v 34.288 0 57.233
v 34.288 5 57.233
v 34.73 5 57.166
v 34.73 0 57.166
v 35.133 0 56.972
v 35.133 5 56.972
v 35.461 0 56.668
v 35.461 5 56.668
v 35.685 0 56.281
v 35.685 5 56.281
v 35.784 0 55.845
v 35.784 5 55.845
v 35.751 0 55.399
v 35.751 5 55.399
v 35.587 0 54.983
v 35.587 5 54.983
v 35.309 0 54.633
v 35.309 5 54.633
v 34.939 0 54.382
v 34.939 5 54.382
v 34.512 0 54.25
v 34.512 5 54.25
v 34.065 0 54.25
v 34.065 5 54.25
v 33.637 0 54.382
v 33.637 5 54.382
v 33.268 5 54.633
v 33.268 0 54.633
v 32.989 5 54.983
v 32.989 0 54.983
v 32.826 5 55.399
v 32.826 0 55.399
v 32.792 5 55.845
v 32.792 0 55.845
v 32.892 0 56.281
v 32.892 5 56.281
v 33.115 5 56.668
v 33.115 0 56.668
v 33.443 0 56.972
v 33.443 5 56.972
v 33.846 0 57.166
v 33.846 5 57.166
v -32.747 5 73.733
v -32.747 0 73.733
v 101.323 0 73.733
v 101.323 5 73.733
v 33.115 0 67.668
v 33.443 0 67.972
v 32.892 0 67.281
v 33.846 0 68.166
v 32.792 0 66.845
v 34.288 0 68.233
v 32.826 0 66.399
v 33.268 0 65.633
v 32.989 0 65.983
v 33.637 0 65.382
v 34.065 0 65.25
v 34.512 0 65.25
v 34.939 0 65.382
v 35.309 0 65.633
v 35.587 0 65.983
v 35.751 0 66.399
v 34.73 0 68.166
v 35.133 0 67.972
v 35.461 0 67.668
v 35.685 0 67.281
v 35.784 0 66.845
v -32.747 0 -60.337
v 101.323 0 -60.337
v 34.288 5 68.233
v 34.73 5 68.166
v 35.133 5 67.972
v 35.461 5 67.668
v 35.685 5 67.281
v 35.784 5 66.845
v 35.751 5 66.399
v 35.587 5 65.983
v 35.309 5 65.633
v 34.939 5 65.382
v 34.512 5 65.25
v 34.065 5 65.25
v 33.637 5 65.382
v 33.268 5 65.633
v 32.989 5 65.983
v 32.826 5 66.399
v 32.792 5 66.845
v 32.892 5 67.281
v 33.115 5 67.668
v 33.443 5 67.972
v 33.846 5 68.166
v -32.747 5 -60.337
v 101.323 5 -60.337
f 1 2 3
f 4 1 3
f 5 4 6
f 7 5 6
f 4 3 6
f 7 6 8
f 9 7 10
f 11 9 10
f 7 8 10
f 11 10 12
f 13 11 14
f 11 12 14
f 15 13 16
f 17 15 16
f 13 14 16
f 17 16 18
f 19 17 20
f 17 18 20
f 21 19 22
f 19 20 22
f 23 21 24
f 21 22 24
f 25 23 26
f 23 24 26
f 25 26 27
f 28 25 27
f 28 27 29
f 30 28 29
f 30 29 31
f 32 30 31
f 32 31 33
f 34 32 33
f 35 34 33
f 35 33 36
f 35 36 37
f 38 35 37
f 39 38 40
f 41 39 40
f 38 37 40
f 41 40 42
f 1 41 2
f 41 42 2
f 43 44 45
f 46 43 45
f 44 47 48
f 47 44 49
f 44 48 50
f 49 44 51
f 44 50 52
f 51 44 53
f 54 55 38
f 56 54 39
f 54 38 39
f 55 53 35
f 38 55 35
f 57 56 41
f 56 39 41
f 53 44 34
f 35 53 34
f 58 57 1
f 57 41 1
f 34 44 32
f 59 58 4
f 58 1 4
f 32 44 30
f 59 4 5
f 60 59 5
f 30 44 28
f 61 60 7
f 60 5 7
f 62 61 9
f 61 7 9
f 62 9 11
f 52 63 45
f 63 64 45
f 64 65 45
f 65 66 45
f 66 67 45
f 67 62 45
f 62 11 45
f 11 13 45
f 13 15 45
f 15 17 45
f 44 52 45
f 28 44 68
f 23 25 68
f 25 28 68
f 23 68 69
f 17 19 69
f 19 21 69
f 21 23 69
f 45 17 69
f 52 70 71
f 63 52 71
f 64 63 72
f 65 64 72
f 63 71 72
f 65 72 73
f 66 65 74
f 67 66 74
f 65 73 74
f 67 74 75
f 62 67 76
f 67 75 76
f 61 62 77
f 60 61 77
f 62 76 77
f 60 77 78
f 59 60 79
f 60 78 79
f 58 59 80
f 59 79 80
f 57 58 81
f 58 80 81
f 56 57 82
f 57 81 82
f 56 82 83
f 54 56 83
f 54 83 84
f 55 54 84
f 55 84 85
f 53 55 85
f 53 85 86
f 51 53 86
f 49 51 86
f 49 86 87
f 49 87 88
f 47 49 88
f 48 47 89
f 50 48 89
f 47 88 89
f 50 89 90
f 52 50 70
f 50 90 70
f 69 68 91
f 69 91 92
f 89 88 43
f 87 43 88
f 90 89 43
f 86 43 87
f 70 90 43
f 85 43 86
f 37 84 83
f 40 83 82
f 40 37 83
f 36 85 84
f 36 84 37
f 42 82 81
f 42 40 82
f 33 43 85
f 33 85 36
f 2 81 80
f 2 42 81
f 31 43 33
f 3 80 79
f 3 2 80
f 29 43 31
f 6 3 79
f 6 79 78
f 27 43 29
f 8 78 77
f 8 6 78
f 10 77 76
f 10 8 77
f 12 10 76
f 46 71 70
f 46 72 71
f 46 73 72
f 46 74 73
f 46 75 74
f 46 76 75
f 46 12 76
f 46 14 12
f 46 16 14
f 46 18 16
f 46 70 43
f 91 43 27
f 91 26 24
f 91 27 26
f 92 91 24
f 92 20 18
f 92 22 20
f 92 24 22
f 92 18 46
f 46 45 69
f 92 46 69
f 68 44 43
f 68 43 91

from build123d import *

# Parameters (mm, degrees)
ESBO_O1_W                = 134.07
ESBO_O1_H                = 134.07
RESSALTO_EXTRUS_O1_DEPTH = 5
ESBO_O2_R                = 1.5
CORTE_EXTRUS_O1_DEPTH    = 5


with BuildPart() as part:
    # Esboço1 → Ressalto-extrusão1 (new body)
    with BuildSketch(Plane(origin=(0, 0, 0), x_dir=(1, 0, 0), z_dir=(0, 1, 0))):
        with Locations((34.28824492, -6.698016278)):
            Rectangle(ESBO_O1_W, ESBO_O1_H)
    extrude(amount=RESSALTO_EXTRUS_O1_DEPTH)

    # Esboço2 → Corte-extrusão1 (cut)
    with BuildSketch(Plane(origin=(0, 5, 0), x_dir=(1, 0, 0), z_dir=(0, 1, 0))):
        with Locations(Location((34.28824492, -55.733016278, 0), (0, 0, 270))):
            Circle(ESBO_O2_R)
        with Locations(Location((34.28824492, -66.733016278, 0), (0, 0, 270))):
            Circle(ESBO_O2_R)
    extrude(amount=-CORTE_EXTRUS_O1_DEPTH, mode=Mode.SUBTRACT)


solid = part.part
